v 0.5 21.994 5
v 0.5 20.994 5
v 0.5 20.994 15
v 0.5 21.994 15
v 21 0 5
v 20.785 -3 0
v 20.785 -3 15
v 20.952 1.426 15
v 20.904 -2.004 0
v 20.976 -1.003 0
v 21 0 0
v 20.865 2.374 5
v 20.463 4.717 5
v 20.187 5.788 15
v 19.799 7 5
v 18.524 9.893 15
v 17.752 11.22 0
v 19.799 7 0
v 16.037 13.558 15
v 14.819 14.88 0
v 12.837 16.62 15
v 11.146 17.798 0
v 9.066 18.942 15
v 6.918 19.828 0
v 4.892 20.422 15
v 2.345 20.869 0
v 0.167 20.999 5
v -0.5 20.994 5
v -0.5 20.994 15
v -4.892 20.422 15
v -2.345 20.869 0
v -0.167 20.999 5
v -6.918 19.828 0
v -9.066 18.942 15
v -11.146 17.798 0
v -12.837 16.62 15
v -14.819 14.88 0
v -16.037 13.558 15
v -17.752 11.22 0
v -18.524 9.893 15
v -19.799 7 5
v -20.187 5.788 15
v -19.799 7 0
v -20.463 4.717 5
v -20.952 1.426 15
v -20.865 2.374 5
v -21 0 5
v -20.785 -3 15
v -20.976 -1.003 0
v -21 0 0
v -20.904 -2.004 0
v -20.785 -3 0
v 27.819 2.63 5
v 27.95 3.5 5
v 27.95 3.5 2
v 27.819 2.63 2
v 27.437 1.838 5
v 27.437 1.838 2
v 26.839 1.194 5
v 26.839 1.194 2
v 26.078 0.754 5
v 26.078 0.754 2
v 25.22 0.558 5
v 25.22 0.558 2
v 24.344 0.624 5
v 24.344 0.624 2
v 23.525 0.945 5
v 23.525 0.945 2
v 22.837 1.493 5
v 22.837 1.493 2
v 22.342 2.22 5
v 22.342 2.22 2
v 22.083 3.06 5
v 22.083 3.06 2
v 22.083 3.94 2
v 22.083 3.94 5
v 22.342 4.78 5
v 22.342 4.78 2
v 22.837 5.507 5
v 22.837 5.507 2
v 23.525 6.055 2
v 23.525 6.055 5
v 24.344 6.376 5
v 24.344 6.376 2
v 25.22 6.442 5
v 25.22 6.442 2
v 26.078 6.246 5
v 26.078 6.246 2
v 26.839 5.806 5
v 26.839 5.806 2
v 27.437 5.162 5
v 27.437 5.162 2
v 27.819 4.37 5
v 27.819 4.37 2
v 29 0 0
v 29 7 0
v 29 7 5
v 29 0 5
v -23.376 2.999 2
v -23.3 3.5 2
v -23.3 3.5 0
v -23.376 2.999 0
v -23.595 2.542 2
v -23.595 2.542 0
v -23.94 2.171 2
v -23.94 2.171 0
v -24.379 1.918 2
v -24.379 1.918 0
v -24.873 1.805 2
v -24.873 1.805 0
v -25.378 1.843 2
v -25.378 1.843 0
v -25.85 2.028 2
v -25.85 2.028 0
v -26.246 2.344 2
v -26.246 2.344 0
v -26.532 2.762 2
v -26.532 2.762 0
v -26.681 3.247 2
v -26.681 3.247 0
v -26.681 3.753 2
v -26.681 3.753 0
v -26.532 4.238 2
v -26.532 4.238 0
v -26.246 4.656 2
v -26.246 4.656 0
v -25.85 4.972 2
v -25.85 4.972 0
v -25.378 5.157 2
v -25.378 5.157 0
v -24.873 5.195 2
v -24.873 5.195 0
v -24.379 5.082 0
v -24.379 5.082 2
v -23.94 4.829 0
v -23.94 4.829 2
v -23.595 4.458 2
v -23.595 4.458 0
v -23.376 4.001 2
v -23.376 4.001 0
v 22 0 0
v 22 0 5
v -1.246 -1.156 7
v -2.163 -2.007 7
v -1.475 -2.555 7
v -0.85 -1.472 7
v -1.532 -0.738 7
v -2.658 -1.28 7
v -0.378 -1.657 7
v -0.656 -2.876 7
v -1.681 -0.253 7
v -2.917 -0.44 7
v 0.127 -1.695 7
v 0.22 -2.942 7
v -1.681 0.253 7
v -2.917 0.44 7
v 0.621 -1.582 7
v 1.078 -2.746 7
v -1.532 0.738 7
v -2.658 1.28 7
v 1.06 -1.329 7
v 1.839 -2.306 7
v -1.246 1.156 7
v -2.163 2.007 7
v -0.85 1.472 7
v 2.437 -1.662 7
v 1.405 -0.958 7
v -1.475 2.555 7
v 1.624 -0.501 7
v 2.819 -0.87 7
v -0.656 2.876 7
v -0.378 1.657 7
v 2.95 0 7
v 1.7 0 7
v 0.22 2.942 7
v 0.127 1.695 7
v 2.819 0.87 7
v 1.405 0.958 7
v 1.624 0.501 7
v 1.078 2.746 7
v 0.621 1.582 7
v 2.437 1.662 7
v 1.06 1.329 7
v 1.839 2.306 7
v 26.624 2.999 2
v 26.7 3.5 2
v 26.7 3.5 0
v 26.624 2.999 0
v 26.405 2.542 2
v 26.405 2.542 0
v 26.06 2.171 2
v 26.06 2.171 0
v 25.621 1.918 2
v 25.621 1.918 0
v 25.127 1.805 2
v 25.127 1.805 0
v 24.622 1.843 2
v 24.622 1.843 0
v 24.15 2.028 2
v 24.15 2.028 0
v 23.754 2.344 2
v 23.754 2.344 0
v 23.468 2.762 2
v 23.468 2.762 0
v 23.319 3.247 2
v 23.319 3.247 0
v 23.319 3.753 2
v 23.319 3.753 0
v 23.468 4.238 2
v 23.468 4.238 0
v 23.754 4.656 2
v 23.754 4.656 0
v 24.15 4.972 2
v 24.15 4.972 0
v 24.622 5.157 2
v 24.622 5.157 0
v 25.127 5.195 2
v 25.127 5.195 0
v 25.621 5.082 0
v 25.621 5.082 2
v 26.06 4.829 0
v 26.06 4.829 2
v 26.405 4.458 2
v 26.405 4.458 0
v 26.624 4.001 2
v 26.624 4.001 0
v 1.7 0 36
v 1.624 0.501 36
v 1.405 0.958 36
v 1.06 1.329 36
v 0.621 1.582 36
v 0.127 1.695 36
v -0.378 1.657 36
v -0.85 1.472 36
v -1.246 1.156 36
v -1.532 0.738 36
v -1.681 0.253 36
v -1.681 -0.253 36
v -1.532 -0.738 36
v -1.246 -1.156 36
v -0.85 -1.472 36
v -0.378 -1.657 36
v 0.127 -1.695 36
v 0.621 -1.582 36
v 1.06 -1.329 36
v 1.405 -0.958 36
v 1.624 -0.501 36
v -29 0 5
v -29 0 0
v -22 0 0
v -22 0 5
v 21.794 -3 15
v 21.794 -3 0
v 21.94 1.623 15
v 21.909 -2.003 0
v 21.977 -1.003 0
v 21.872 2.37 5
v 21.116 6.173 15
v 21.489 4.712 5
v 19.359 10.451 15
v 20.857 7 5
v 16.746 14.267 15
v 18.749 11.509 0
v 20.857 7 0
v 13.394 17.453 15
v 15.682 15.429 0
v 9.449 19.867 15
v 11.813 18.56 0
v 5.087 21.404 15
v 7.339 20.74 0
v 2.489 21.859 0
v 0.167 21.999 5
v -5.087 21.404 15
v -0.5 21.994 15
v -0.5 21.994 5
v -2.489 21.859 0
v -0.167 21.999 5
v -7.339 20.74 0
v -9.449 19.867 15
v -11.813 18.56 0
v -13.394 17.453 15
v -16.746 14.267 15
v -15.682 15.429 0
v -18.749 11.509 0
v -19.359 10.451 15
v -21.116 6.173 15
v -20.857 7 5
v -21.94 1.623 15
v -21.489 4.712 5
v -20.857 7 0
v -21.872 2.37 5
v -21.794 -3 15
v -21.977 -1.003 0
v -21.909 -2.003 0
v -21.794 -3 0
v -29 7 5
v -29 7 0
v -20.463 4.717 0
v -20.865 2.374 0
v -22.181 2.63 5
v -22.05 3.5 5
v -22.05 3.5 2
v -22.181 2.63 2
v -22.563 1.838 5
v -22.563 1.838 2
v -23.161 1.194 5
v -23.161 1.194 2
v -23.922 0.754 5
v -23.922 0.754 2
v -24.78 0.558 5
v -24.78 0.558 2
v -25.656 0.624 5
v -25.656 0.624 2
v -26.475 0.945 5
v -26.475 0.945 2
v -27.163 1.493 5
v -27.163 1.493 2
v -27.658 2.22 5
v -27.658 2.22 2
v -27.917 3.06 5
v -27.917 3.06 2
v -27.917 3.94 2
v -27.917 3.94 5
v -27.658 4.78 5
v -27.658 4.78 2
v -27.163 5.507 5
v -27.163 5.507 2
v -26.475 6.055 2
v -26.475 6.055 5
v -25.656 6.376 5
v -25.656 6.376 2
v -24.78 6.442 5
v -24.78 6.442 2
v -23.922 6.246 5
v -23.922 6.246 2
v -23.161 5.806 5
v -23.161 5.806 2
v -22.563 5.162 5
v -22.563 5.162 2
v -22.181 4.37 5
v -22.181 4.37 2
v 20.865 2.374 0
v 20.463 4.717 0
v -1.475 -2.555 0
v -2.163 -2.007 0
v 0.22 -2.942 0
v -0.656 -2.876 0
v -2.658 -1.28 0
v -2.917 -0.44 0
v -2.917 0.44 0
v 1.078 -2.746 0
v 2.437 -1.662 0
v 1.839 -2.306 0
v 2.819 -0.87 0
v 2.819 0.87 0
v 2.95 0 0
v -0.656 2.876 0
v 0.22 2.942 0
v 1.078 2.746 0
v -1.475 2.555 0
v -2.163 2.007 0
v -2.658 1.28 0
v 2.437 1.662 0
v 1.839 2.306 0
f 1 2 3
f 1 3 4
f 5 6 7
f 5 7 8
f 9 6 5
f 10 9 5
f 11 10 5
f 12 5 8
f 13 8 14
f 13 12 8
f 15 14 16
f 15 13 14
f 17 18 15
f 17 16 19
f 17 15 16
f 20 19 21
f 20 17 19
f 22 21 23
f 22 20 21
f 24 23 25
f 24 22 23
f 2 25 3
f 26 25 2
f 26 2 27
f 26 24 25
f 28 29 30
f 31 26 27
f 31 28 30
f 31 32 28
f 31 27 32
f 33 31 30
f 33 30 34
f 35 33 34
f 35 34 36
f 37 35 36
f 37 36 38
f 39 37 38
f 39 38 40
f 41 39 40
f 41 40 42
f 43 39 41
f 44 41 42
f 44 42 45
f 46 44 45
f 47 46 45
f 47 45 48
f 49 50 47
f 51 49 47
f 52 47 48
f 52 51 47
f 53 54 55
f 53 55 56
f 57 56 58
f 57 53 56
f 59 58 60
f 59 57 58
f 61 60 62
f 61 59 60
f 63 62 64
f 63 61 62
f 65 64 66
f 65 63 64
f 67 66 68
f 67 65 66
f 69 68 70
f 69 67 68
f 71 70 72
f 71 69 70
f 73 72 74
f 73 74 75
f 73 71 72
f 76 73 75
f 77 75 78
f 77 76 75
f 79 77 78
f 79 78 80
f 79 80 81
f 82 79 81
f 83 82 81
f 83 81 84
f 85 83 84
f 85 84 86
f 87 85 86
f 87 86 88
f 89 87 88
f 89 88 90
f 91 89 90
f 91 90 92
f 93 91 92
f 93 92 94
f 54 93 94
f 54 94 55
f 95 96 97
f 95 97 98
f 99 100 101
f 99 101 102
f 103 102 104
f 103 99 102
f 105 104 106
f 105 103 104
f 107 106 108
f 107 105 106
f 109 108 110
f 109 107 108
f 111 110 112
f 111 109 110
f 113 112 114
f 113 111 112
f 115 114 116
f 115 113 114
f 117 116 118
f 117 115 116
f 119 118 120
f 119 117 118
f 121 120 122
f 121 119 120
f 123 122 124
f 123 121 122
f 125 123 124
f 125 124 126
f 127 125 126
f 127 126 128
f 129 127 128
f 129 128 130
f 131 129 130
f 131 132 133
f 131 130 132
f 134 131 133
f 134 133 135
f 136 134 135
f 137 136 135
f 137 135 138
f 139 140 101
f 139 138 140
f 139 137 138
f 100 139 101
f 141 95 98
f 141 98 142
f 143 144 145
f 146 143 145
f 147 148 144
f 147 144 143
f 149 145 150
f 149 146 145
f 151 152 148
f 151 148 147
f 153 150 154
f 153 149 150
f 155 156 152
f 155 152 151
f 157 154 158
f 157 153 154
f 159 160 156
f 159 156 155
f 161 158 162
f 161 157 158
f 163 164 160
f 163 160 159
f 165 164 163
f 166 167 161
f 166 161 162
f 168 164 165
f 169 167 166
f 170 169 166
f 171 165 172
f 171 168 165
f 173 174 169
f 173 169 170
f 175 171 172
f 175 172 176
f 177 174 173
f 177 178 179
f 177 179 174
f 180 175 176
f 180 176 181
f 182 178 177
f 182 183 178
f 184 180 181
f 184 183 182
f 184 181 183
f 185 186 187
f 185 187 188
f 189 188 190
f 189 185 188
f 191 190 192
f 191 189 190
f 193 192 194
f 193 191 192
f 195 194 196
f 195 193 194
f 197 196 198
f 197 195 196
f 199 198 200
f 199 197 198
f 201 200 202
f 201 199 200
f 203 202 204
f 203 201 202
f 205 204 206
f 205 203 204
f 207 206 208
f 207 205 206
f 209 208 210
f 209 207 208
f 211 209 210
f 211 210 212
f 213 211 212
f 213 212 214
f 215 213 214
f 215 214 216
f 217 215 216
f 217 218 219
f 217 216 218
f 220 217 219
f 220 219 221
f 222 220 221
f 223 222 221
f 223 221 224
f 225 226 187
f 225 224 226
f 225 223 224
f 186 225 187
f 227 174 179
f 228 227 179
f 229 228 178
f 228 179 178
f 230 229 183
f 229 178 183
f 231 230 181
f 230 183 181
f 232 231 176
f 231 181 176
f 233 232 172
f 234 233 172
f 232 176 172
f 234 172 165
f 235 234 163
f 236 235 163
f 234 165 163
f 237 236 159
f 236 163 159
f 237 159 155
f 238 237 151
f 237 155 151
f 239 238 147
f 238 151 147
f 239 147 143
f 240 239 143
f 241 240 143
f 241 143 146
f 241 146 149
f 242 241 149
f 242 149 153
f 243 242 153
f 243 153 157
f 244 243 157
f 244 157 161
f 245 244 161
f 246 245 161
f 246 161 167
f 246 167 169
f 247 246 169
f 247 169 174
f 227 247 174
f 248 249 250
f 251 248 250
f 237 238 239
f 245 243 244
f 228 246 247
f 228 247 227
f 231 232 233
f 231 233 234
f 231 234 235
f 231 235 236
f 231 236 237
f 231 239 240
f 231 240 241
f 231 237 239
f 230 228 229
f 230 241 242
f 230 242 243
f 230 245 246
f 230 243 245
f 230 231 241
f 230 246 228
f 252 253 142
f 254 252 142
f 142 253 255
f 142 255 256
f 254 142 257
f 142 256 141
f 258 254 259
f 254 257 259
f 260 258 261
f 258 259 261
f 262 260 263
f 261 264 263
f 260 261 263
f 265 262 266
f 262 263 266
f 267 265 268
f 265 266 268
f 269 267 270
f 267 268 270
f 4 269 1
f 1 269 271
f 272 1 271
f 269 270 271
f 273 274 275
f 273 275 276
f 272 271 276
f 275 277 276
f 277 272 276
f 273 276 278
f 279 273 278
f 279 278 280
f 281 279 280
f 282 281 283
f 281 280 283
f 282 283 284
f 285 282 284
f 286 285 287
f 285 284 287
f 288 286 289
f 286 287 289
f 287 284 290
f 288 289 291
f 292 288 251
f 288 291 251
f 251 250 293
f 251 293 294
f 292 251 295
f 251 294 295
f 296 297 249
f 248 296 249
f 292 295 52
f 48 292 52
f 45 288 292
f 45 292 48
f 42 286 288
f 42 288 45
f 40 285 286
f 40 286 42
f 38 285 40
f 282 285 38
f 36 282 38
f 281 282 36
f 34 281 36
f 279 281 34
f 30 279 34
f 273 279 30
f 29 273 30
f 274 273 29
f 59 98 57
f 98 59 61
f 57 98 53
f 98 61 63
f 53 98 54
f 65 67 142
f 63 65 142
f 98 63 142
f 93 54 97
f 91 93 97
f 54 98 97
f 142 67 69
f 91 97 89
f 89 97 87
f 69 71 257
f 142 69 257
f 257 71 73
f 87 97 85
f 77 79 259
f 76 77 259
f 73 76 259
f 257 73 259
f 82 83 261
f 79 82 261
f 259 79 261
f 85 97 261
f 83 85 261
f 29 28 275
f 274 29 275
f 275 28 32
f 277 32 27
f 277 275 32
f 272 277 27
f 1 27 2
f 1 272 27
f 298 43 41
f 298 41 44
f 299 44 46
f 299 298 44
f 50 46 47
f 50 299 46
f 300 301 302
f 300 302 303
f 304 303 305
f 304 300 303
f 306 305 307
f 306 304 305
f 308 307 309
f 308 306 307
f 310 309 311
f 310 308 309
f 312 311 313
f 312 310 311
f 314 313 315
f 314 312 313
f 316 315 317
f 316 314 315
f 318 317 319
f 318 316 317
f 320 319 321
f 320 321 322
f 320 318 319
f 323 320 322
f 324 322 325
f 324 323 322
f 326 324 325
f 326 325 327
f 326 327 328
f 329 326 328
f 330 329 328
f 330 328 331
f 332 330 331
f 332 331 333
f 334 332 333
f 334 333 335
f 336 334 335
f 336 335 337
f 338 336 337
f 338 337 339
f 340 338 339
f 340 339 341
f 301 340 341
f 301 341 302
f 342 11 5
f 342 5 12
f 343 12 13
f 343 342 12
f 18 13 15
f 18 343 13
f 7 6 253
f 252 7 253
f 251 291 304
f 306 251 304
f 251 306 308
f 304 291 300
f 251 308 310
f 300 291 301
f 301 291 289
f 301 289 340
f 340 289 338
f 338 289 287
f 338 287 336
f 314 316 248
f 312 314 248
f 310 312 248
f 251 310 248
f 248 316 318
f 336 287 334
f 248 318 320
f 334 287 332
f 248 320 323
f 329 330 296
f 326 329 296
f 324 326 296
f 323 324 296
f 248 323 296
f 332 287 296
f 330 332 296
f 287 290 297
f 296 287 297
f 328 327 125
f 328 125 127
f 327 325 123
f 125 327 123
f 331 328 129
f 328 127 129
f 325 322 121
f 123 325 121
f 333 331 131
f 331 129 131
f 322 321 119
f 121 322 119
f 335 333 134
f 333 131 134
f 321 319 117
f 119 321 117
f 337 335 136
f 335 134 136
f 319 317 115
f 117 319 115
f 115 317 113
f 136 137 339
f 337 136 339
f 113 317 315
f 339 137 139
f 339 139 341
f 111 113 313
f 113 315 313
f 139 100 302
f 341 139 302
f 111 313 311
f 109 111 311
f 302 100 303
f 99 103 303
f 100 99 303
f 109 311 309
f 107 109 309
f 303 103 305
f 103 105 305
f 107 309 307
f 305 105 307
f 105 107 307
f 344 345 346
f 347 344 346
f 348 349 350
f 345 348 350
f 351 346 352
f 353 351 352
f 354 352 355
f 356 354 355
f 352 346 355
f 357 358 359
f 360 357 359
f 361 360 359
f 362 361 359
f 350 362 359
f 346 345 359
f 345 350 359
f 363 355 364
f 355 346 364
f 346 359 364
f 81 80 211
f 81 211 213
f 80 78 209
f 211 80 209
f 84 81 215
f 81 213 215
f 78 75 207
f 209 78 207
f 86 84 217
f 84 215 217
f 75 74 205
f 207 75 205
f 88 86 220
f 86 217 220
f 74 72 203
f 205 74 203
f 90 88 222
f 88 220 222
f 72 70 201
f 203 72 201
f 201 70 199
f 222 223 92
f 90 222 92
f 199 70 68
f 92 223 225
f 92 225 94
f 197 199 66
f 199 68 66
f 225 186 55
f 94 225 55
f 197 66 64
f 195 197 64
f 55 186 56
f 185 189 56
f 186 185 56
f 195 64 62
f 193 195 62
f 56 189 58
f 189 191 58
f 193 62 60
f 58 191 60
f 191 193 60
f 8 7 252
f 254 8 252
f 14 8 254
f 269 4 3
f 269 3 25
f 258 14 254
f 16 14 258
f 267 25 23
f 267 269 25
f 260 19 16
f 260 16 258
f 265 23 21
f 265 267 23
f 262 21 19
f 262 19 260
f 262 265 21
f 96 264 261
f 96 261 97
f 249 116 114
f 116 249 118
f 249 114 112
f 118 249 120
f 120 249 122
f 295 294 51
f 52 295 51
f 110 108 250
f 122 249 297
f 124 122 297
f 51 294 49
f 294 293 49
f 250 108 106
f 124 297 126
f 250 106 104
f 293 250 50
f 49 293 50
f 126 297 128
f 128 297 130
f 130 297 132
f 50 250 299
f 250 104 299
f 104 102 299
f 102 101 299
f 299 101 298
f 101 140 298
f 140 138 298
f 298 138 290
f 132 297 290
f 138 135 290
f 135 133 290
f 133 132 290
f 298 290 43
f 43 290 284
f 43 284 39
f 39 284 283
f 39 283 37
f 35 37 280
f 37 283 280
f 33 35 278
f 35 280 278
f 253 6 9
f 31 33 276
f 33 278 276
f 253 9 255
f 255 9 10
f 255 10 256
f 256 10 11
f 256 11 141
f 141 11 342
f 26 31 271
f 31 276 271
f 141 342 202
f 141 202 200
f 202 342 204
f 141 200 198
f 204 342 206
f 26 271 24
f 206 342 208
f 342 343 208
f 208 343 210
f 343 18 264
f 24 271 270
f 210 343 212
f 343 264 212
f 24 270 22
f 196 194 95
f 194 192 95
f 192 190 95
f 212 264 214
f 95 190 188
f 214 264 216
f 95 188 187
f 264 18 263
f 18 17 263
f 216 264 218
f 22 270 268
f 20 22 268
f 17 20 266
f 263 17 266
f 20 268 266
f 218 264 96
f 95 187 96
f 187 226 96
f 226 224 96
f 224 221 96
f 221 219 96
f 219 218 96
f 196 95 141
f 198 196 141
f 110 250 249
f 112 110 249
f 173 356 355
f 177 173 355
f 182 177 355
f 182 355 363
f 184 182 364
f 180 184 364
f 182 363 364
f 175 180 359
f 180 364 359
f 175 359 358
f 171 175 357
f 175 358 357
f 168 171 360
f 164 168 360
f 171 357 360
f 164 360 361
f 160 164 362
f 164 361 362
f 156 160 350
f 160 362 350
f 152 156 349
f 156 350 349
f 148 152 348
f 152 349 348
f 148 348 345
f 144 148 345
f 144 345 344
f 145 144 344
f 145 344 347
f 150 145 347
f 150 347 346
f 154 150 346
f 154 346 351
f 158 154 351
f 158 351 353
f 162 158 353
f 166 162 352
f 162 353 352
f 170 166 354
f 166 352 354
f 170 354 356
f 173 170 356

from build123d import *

# Parameters (mm, degrees)
CYLINDER_R               = 2.95
CYLINDER_DEPTH           = 7
CYLINDER001_R            = 1.7
CYLINDER001_DEPTH        = 30
BOX259_W                 = 1
BOX259_H                 = 9
BOX259_DEPTH             = 11
CLONE343_PLACEMENT_ANGLE = 180
CLONE344_PLACEMENT_ANGLE = 180
PAD043_DEPTH             = 15
PAD044_DEPTH             = 5


with BuildPart() as m3bolthead:
    # Cylinder → Cylinder (new body)
    with BuildSketch(Plane.XY):
        Circle(CYLINDER_R)
    extrude(amount=CYLINDER_DEPTH)


with BuildPart() as m3bolt:
    # Cylinder001 → Cylinder001 (new body)
    with BuildSketch(Plane.XY.offset(6)):
        Circle(CYLINDER001_R)
    extrude(amount=CYLINDER001_DEPTH)

    # Fusion: union M3BoltHead
    add(m3bolthead.part)


with BuildPart() as cube022:
    # Box259 → Box259 (new body)
    with BuildSketch(Plane(origin=(-0.5, 16, 5), x_dir=(1, 0, 0), z_dir=(0, 0, 1))):
        with Locations((0.5, 4.5)):
            Rectangle(BOX259_W, BOX259_H)
    extrude(amount=BOX259_DEPTH)


with BuildPart() as clone_of_m3bolt114:
    # Clone343 base: copy of M3Bolt
    add(m3bolt.part)


with BuildPart() as clone_of_m3bolt114_1:
    # Clone343 placement: moved
    add(clone_of_m3bolt114.part.moved(Location((25, 3.5, 9))).rotate(Axis((25, 3.5, 9), (1, 0, 0)), CLONE343_PLACEMENT_ANGLE))


with BuildPart() as fusion127:
    # Clone344 base: copy of M3Bolt
    add(m3bolt.part)


with BuildPart() as fusion127_1:
    # Clone344 placement: moved
    add(fusion127.part.moved(Location((-25, 3.5, 9))).rotate(Axis((-25, 3.5, 9), (1, 0, 0)), CLONE344_PLACEMENT_ANGLE))

    # Fusion127: union Clone of M3Bolt114
    add(clone_of_m3bolt114_1.part)


with BuildPart() as pad043:
    # Sketch068 → Pad043 (new body)
    with BuildSketch(Plane.XY):
        with BuildLine():
            ThreePointArc((21.794495, -3), (0, 22), (-21.794495, -3))
            Line((-21.794495, -3), (-20.78461, -3))
            ThreePointArc((20.78461, -3), (0, 21), (-20.78461, -3))
            Line((20.78461, -3), (21.794495, -3))
        make_face()
    extrude(amount=PAD043_DEPTH)


with BuildPart() as art23optodiskmaster:
    # Sketch069 → Pad044 (new body)
    with BuildSketch(Plane.XY):
        with BuildLine():
            ThreePointArc((21, 0), (20.69757, 3.551142), (19.79899, 7))
            Line((19.79899, 7), (29, 7))
            Line((29, 7), (29, 0))
            Line((29, 0), (21, 0))
        make_face()
        with BuildLine():
            ThreePointArc((-19.79899, 7), (-20.69757, 3.551142), (-21, 0))
            Line((-29, 0), (-21, 0))
            Line((-29, 7), (-29, 0))
            Line((-19.79899, 7), (-29, 7))
        make_face()
    extrude(amount=PAD044_DEPTH)

    # Fusion126: union Pad043
    add(pad043.part)

    # Cut107: cut Fusion127
    add(fusion127_1.part, mode=Mode.SUBTRACT)

    # Cut108: cut Cube022
    add(cube022.part, mode=Mode.SUBTRACT)


solid = Compound([m3bolt.part, art23optodiskmaster.part])
